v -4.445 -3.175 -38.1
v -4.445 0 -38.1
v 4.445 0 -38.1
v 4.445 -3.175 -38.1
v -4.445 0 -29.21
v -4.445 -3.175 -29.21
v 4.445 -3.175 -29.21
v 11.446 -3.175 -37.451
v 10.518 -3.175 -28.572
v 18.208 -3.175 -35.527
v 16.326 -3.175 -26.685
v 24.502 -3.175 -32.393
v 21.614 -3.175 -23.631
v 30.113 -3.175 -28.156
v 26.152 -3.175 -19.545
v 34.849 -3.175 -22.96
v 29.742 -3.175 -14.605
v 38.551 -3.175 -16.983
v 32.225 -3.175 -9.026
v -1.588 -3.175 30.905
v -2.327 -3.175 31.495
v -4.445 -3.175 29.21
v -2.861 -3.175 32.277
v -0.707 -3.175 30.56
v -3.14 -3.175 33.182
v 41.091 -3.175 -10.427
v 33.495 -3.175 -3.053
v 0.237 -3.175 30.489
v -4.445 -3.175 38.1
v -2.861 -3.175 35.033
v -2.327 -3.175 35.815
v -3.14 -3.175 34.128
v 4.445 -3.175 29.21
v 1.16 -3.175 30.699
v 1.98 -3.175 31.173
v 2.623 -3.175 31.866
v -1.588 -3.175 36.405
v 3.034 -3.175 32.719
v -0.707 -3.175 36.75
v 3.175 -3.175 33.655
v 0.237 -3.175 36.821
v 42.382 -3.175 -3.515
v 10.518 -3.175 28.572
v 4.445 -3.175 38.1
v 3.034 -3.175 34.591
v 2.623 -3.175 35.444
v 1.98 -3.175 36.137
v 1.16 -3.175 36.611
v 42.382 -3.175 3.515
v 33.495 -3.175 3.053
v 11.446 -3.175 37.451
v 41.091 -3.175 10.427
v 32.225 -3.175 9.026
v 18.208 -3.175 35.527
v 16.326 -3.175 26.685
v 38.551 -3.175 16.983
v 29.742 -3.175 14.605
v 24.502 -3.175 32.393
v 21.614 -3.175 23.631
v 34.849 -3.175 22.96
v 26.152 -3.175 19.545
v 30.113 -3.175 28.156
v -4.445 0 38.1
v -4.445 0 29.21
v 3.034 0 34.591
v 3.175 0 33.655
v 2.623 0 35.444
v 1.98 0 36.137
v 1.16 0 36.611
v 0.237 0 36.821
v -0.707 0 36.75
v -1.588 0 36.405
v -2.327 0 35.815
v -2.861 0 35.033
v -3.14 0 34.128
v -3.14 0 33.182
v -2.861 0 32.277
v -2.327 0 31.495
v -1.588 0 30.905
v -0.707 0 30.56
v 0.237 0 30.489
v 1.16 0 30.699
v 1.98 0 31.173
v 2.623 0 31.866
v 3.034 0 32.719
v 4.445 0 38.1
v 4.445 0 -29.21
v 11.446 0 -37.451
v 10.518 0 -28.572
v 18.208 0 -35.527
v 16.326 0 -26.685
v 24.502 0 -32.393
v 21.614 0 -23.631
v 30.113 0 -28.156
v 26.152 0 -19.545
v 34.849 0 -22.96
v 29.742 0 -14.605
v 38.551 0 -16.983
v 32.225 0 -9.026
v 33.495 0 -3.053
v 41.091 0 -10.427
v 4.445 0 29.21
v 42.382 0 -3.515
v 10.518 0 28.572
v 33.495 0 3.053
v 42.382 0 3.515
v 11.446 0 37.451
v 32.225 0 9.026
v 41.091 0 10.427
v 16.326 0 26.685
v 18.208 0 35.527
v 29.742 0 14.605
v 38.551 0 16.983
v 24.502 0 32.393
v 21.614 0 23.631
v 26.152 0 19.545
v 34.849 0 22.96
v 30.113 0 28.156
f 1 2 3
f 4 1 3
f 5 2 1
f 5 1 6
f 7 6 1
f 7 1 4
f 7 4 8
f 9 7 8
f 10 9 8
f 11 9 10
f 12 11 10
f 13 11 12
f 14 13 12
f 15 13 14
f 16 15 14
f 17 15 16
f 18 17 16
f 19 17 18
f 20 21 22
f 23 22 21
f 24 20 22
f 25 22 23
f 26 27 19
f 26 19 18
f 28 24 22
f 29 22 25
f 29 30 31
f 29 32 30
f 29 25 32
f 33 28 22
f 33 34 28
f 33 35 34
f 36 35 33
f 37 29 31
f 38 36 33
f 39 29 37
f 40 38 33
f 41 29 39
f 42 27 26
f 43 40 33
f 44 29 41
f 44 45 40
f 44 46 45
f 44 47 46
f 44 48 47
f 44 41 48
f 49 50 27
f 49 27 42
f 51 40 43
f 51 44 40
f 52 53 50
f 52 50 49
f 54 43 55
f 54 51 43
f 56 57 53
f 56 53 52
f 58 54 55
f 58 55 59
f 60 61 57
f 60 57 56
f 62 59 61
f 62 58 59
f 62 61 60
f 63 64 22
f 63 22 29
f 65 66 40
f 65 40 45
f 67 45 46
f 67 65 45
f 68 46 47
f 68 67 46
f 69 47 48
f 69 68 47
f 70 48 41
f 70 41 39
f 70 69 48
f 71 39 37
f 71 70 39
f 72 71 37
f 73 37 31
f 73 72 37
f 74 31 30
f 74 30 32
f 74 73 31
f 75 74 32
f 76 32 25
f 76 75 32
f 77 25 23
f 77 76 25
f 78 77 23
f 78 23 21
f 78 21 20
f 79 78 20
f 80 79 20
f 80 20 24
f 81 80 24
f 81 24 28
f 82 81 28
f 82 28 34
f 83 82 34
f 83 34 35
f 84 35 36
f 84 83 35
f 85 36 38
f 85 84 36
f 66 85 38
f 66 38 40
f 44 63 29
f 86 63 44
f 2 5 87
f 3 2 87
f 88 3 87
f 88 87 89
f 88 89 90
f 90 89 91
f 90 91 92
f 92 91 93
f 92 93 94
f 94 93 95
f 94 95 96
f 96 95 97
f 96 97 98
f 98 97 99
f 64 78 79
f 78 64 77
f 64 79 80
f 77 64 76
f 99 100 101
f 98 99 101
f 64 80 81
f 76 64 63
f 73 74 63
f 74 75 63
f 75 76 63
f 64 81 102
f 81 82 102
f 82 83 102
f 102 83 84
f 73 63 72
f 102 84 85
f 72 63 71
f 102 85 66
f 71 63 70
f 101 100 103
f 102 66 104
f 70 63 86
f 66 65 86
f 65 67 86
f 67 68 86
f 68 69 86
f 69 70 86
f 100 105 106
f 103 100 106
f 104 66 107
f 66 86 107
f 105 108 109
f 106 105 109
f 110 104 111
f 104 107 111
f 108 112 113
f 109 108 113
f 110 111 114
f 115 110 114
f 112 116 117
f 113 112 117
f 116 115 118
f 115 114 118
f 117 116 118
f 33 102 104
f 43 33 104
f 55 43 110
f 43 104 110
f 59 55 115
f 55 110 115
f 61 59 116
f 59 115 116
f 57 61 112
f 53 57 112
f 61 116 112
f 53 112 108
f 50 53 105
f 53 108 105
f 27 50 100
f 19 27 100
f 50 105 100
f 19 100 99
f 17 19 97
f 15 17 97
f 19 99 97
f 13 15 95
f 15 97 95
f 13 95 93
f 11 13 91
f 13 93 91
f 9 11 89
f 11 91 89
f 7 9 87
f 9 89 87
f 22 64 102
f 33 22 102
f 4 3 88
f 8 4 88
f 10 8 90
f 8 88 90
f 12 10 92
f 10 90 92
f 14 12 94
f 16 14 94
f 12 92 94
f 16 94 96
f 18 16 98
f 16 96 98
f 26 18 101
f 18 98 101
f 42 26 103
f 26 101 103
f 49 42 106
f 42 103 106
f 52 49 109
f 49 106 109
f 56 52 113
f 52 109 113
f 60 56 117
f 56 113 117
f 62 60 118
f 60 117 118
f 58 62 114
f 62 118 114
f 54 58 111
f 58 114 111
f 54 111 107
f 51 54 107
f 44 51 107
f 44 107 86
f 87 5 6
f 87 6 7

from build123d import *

# Parameters (mm, degrees)
F0_W     = 8.89
F0_H     = 8.89
F0_R     = 3.175
F1_DEPTH = 3.175


with BuildPart() as f1:
    # F0 (on Front) → F1 (new body)
    with BuildSketch(Plane.XZ):
        with Locations((0, 33.655)):
            Rectangle(F0_W, F0_H)
        with Locations((0, 33.655)):
            Circle(F0_R, mode=Mode.SUBTRACT)
        with Locations((0, -33.655)):
            Rectangle(F0_W, F0_H)
        with BuildLine():
            ThreePointArc((4.445, -38.1), (42.545, 0), (4.445, 38.1))
            Line((4.445, 38.1), (4.445, 29.21))
            ThreePointArc((4.445, 29.21), (33.655, 0), (4.445, -29.21))
            Line((4.445, -29.21), (4.445, -38.1))
        make_face()
    extrude(amount=F1_DEPTH)


solid = f1.part
